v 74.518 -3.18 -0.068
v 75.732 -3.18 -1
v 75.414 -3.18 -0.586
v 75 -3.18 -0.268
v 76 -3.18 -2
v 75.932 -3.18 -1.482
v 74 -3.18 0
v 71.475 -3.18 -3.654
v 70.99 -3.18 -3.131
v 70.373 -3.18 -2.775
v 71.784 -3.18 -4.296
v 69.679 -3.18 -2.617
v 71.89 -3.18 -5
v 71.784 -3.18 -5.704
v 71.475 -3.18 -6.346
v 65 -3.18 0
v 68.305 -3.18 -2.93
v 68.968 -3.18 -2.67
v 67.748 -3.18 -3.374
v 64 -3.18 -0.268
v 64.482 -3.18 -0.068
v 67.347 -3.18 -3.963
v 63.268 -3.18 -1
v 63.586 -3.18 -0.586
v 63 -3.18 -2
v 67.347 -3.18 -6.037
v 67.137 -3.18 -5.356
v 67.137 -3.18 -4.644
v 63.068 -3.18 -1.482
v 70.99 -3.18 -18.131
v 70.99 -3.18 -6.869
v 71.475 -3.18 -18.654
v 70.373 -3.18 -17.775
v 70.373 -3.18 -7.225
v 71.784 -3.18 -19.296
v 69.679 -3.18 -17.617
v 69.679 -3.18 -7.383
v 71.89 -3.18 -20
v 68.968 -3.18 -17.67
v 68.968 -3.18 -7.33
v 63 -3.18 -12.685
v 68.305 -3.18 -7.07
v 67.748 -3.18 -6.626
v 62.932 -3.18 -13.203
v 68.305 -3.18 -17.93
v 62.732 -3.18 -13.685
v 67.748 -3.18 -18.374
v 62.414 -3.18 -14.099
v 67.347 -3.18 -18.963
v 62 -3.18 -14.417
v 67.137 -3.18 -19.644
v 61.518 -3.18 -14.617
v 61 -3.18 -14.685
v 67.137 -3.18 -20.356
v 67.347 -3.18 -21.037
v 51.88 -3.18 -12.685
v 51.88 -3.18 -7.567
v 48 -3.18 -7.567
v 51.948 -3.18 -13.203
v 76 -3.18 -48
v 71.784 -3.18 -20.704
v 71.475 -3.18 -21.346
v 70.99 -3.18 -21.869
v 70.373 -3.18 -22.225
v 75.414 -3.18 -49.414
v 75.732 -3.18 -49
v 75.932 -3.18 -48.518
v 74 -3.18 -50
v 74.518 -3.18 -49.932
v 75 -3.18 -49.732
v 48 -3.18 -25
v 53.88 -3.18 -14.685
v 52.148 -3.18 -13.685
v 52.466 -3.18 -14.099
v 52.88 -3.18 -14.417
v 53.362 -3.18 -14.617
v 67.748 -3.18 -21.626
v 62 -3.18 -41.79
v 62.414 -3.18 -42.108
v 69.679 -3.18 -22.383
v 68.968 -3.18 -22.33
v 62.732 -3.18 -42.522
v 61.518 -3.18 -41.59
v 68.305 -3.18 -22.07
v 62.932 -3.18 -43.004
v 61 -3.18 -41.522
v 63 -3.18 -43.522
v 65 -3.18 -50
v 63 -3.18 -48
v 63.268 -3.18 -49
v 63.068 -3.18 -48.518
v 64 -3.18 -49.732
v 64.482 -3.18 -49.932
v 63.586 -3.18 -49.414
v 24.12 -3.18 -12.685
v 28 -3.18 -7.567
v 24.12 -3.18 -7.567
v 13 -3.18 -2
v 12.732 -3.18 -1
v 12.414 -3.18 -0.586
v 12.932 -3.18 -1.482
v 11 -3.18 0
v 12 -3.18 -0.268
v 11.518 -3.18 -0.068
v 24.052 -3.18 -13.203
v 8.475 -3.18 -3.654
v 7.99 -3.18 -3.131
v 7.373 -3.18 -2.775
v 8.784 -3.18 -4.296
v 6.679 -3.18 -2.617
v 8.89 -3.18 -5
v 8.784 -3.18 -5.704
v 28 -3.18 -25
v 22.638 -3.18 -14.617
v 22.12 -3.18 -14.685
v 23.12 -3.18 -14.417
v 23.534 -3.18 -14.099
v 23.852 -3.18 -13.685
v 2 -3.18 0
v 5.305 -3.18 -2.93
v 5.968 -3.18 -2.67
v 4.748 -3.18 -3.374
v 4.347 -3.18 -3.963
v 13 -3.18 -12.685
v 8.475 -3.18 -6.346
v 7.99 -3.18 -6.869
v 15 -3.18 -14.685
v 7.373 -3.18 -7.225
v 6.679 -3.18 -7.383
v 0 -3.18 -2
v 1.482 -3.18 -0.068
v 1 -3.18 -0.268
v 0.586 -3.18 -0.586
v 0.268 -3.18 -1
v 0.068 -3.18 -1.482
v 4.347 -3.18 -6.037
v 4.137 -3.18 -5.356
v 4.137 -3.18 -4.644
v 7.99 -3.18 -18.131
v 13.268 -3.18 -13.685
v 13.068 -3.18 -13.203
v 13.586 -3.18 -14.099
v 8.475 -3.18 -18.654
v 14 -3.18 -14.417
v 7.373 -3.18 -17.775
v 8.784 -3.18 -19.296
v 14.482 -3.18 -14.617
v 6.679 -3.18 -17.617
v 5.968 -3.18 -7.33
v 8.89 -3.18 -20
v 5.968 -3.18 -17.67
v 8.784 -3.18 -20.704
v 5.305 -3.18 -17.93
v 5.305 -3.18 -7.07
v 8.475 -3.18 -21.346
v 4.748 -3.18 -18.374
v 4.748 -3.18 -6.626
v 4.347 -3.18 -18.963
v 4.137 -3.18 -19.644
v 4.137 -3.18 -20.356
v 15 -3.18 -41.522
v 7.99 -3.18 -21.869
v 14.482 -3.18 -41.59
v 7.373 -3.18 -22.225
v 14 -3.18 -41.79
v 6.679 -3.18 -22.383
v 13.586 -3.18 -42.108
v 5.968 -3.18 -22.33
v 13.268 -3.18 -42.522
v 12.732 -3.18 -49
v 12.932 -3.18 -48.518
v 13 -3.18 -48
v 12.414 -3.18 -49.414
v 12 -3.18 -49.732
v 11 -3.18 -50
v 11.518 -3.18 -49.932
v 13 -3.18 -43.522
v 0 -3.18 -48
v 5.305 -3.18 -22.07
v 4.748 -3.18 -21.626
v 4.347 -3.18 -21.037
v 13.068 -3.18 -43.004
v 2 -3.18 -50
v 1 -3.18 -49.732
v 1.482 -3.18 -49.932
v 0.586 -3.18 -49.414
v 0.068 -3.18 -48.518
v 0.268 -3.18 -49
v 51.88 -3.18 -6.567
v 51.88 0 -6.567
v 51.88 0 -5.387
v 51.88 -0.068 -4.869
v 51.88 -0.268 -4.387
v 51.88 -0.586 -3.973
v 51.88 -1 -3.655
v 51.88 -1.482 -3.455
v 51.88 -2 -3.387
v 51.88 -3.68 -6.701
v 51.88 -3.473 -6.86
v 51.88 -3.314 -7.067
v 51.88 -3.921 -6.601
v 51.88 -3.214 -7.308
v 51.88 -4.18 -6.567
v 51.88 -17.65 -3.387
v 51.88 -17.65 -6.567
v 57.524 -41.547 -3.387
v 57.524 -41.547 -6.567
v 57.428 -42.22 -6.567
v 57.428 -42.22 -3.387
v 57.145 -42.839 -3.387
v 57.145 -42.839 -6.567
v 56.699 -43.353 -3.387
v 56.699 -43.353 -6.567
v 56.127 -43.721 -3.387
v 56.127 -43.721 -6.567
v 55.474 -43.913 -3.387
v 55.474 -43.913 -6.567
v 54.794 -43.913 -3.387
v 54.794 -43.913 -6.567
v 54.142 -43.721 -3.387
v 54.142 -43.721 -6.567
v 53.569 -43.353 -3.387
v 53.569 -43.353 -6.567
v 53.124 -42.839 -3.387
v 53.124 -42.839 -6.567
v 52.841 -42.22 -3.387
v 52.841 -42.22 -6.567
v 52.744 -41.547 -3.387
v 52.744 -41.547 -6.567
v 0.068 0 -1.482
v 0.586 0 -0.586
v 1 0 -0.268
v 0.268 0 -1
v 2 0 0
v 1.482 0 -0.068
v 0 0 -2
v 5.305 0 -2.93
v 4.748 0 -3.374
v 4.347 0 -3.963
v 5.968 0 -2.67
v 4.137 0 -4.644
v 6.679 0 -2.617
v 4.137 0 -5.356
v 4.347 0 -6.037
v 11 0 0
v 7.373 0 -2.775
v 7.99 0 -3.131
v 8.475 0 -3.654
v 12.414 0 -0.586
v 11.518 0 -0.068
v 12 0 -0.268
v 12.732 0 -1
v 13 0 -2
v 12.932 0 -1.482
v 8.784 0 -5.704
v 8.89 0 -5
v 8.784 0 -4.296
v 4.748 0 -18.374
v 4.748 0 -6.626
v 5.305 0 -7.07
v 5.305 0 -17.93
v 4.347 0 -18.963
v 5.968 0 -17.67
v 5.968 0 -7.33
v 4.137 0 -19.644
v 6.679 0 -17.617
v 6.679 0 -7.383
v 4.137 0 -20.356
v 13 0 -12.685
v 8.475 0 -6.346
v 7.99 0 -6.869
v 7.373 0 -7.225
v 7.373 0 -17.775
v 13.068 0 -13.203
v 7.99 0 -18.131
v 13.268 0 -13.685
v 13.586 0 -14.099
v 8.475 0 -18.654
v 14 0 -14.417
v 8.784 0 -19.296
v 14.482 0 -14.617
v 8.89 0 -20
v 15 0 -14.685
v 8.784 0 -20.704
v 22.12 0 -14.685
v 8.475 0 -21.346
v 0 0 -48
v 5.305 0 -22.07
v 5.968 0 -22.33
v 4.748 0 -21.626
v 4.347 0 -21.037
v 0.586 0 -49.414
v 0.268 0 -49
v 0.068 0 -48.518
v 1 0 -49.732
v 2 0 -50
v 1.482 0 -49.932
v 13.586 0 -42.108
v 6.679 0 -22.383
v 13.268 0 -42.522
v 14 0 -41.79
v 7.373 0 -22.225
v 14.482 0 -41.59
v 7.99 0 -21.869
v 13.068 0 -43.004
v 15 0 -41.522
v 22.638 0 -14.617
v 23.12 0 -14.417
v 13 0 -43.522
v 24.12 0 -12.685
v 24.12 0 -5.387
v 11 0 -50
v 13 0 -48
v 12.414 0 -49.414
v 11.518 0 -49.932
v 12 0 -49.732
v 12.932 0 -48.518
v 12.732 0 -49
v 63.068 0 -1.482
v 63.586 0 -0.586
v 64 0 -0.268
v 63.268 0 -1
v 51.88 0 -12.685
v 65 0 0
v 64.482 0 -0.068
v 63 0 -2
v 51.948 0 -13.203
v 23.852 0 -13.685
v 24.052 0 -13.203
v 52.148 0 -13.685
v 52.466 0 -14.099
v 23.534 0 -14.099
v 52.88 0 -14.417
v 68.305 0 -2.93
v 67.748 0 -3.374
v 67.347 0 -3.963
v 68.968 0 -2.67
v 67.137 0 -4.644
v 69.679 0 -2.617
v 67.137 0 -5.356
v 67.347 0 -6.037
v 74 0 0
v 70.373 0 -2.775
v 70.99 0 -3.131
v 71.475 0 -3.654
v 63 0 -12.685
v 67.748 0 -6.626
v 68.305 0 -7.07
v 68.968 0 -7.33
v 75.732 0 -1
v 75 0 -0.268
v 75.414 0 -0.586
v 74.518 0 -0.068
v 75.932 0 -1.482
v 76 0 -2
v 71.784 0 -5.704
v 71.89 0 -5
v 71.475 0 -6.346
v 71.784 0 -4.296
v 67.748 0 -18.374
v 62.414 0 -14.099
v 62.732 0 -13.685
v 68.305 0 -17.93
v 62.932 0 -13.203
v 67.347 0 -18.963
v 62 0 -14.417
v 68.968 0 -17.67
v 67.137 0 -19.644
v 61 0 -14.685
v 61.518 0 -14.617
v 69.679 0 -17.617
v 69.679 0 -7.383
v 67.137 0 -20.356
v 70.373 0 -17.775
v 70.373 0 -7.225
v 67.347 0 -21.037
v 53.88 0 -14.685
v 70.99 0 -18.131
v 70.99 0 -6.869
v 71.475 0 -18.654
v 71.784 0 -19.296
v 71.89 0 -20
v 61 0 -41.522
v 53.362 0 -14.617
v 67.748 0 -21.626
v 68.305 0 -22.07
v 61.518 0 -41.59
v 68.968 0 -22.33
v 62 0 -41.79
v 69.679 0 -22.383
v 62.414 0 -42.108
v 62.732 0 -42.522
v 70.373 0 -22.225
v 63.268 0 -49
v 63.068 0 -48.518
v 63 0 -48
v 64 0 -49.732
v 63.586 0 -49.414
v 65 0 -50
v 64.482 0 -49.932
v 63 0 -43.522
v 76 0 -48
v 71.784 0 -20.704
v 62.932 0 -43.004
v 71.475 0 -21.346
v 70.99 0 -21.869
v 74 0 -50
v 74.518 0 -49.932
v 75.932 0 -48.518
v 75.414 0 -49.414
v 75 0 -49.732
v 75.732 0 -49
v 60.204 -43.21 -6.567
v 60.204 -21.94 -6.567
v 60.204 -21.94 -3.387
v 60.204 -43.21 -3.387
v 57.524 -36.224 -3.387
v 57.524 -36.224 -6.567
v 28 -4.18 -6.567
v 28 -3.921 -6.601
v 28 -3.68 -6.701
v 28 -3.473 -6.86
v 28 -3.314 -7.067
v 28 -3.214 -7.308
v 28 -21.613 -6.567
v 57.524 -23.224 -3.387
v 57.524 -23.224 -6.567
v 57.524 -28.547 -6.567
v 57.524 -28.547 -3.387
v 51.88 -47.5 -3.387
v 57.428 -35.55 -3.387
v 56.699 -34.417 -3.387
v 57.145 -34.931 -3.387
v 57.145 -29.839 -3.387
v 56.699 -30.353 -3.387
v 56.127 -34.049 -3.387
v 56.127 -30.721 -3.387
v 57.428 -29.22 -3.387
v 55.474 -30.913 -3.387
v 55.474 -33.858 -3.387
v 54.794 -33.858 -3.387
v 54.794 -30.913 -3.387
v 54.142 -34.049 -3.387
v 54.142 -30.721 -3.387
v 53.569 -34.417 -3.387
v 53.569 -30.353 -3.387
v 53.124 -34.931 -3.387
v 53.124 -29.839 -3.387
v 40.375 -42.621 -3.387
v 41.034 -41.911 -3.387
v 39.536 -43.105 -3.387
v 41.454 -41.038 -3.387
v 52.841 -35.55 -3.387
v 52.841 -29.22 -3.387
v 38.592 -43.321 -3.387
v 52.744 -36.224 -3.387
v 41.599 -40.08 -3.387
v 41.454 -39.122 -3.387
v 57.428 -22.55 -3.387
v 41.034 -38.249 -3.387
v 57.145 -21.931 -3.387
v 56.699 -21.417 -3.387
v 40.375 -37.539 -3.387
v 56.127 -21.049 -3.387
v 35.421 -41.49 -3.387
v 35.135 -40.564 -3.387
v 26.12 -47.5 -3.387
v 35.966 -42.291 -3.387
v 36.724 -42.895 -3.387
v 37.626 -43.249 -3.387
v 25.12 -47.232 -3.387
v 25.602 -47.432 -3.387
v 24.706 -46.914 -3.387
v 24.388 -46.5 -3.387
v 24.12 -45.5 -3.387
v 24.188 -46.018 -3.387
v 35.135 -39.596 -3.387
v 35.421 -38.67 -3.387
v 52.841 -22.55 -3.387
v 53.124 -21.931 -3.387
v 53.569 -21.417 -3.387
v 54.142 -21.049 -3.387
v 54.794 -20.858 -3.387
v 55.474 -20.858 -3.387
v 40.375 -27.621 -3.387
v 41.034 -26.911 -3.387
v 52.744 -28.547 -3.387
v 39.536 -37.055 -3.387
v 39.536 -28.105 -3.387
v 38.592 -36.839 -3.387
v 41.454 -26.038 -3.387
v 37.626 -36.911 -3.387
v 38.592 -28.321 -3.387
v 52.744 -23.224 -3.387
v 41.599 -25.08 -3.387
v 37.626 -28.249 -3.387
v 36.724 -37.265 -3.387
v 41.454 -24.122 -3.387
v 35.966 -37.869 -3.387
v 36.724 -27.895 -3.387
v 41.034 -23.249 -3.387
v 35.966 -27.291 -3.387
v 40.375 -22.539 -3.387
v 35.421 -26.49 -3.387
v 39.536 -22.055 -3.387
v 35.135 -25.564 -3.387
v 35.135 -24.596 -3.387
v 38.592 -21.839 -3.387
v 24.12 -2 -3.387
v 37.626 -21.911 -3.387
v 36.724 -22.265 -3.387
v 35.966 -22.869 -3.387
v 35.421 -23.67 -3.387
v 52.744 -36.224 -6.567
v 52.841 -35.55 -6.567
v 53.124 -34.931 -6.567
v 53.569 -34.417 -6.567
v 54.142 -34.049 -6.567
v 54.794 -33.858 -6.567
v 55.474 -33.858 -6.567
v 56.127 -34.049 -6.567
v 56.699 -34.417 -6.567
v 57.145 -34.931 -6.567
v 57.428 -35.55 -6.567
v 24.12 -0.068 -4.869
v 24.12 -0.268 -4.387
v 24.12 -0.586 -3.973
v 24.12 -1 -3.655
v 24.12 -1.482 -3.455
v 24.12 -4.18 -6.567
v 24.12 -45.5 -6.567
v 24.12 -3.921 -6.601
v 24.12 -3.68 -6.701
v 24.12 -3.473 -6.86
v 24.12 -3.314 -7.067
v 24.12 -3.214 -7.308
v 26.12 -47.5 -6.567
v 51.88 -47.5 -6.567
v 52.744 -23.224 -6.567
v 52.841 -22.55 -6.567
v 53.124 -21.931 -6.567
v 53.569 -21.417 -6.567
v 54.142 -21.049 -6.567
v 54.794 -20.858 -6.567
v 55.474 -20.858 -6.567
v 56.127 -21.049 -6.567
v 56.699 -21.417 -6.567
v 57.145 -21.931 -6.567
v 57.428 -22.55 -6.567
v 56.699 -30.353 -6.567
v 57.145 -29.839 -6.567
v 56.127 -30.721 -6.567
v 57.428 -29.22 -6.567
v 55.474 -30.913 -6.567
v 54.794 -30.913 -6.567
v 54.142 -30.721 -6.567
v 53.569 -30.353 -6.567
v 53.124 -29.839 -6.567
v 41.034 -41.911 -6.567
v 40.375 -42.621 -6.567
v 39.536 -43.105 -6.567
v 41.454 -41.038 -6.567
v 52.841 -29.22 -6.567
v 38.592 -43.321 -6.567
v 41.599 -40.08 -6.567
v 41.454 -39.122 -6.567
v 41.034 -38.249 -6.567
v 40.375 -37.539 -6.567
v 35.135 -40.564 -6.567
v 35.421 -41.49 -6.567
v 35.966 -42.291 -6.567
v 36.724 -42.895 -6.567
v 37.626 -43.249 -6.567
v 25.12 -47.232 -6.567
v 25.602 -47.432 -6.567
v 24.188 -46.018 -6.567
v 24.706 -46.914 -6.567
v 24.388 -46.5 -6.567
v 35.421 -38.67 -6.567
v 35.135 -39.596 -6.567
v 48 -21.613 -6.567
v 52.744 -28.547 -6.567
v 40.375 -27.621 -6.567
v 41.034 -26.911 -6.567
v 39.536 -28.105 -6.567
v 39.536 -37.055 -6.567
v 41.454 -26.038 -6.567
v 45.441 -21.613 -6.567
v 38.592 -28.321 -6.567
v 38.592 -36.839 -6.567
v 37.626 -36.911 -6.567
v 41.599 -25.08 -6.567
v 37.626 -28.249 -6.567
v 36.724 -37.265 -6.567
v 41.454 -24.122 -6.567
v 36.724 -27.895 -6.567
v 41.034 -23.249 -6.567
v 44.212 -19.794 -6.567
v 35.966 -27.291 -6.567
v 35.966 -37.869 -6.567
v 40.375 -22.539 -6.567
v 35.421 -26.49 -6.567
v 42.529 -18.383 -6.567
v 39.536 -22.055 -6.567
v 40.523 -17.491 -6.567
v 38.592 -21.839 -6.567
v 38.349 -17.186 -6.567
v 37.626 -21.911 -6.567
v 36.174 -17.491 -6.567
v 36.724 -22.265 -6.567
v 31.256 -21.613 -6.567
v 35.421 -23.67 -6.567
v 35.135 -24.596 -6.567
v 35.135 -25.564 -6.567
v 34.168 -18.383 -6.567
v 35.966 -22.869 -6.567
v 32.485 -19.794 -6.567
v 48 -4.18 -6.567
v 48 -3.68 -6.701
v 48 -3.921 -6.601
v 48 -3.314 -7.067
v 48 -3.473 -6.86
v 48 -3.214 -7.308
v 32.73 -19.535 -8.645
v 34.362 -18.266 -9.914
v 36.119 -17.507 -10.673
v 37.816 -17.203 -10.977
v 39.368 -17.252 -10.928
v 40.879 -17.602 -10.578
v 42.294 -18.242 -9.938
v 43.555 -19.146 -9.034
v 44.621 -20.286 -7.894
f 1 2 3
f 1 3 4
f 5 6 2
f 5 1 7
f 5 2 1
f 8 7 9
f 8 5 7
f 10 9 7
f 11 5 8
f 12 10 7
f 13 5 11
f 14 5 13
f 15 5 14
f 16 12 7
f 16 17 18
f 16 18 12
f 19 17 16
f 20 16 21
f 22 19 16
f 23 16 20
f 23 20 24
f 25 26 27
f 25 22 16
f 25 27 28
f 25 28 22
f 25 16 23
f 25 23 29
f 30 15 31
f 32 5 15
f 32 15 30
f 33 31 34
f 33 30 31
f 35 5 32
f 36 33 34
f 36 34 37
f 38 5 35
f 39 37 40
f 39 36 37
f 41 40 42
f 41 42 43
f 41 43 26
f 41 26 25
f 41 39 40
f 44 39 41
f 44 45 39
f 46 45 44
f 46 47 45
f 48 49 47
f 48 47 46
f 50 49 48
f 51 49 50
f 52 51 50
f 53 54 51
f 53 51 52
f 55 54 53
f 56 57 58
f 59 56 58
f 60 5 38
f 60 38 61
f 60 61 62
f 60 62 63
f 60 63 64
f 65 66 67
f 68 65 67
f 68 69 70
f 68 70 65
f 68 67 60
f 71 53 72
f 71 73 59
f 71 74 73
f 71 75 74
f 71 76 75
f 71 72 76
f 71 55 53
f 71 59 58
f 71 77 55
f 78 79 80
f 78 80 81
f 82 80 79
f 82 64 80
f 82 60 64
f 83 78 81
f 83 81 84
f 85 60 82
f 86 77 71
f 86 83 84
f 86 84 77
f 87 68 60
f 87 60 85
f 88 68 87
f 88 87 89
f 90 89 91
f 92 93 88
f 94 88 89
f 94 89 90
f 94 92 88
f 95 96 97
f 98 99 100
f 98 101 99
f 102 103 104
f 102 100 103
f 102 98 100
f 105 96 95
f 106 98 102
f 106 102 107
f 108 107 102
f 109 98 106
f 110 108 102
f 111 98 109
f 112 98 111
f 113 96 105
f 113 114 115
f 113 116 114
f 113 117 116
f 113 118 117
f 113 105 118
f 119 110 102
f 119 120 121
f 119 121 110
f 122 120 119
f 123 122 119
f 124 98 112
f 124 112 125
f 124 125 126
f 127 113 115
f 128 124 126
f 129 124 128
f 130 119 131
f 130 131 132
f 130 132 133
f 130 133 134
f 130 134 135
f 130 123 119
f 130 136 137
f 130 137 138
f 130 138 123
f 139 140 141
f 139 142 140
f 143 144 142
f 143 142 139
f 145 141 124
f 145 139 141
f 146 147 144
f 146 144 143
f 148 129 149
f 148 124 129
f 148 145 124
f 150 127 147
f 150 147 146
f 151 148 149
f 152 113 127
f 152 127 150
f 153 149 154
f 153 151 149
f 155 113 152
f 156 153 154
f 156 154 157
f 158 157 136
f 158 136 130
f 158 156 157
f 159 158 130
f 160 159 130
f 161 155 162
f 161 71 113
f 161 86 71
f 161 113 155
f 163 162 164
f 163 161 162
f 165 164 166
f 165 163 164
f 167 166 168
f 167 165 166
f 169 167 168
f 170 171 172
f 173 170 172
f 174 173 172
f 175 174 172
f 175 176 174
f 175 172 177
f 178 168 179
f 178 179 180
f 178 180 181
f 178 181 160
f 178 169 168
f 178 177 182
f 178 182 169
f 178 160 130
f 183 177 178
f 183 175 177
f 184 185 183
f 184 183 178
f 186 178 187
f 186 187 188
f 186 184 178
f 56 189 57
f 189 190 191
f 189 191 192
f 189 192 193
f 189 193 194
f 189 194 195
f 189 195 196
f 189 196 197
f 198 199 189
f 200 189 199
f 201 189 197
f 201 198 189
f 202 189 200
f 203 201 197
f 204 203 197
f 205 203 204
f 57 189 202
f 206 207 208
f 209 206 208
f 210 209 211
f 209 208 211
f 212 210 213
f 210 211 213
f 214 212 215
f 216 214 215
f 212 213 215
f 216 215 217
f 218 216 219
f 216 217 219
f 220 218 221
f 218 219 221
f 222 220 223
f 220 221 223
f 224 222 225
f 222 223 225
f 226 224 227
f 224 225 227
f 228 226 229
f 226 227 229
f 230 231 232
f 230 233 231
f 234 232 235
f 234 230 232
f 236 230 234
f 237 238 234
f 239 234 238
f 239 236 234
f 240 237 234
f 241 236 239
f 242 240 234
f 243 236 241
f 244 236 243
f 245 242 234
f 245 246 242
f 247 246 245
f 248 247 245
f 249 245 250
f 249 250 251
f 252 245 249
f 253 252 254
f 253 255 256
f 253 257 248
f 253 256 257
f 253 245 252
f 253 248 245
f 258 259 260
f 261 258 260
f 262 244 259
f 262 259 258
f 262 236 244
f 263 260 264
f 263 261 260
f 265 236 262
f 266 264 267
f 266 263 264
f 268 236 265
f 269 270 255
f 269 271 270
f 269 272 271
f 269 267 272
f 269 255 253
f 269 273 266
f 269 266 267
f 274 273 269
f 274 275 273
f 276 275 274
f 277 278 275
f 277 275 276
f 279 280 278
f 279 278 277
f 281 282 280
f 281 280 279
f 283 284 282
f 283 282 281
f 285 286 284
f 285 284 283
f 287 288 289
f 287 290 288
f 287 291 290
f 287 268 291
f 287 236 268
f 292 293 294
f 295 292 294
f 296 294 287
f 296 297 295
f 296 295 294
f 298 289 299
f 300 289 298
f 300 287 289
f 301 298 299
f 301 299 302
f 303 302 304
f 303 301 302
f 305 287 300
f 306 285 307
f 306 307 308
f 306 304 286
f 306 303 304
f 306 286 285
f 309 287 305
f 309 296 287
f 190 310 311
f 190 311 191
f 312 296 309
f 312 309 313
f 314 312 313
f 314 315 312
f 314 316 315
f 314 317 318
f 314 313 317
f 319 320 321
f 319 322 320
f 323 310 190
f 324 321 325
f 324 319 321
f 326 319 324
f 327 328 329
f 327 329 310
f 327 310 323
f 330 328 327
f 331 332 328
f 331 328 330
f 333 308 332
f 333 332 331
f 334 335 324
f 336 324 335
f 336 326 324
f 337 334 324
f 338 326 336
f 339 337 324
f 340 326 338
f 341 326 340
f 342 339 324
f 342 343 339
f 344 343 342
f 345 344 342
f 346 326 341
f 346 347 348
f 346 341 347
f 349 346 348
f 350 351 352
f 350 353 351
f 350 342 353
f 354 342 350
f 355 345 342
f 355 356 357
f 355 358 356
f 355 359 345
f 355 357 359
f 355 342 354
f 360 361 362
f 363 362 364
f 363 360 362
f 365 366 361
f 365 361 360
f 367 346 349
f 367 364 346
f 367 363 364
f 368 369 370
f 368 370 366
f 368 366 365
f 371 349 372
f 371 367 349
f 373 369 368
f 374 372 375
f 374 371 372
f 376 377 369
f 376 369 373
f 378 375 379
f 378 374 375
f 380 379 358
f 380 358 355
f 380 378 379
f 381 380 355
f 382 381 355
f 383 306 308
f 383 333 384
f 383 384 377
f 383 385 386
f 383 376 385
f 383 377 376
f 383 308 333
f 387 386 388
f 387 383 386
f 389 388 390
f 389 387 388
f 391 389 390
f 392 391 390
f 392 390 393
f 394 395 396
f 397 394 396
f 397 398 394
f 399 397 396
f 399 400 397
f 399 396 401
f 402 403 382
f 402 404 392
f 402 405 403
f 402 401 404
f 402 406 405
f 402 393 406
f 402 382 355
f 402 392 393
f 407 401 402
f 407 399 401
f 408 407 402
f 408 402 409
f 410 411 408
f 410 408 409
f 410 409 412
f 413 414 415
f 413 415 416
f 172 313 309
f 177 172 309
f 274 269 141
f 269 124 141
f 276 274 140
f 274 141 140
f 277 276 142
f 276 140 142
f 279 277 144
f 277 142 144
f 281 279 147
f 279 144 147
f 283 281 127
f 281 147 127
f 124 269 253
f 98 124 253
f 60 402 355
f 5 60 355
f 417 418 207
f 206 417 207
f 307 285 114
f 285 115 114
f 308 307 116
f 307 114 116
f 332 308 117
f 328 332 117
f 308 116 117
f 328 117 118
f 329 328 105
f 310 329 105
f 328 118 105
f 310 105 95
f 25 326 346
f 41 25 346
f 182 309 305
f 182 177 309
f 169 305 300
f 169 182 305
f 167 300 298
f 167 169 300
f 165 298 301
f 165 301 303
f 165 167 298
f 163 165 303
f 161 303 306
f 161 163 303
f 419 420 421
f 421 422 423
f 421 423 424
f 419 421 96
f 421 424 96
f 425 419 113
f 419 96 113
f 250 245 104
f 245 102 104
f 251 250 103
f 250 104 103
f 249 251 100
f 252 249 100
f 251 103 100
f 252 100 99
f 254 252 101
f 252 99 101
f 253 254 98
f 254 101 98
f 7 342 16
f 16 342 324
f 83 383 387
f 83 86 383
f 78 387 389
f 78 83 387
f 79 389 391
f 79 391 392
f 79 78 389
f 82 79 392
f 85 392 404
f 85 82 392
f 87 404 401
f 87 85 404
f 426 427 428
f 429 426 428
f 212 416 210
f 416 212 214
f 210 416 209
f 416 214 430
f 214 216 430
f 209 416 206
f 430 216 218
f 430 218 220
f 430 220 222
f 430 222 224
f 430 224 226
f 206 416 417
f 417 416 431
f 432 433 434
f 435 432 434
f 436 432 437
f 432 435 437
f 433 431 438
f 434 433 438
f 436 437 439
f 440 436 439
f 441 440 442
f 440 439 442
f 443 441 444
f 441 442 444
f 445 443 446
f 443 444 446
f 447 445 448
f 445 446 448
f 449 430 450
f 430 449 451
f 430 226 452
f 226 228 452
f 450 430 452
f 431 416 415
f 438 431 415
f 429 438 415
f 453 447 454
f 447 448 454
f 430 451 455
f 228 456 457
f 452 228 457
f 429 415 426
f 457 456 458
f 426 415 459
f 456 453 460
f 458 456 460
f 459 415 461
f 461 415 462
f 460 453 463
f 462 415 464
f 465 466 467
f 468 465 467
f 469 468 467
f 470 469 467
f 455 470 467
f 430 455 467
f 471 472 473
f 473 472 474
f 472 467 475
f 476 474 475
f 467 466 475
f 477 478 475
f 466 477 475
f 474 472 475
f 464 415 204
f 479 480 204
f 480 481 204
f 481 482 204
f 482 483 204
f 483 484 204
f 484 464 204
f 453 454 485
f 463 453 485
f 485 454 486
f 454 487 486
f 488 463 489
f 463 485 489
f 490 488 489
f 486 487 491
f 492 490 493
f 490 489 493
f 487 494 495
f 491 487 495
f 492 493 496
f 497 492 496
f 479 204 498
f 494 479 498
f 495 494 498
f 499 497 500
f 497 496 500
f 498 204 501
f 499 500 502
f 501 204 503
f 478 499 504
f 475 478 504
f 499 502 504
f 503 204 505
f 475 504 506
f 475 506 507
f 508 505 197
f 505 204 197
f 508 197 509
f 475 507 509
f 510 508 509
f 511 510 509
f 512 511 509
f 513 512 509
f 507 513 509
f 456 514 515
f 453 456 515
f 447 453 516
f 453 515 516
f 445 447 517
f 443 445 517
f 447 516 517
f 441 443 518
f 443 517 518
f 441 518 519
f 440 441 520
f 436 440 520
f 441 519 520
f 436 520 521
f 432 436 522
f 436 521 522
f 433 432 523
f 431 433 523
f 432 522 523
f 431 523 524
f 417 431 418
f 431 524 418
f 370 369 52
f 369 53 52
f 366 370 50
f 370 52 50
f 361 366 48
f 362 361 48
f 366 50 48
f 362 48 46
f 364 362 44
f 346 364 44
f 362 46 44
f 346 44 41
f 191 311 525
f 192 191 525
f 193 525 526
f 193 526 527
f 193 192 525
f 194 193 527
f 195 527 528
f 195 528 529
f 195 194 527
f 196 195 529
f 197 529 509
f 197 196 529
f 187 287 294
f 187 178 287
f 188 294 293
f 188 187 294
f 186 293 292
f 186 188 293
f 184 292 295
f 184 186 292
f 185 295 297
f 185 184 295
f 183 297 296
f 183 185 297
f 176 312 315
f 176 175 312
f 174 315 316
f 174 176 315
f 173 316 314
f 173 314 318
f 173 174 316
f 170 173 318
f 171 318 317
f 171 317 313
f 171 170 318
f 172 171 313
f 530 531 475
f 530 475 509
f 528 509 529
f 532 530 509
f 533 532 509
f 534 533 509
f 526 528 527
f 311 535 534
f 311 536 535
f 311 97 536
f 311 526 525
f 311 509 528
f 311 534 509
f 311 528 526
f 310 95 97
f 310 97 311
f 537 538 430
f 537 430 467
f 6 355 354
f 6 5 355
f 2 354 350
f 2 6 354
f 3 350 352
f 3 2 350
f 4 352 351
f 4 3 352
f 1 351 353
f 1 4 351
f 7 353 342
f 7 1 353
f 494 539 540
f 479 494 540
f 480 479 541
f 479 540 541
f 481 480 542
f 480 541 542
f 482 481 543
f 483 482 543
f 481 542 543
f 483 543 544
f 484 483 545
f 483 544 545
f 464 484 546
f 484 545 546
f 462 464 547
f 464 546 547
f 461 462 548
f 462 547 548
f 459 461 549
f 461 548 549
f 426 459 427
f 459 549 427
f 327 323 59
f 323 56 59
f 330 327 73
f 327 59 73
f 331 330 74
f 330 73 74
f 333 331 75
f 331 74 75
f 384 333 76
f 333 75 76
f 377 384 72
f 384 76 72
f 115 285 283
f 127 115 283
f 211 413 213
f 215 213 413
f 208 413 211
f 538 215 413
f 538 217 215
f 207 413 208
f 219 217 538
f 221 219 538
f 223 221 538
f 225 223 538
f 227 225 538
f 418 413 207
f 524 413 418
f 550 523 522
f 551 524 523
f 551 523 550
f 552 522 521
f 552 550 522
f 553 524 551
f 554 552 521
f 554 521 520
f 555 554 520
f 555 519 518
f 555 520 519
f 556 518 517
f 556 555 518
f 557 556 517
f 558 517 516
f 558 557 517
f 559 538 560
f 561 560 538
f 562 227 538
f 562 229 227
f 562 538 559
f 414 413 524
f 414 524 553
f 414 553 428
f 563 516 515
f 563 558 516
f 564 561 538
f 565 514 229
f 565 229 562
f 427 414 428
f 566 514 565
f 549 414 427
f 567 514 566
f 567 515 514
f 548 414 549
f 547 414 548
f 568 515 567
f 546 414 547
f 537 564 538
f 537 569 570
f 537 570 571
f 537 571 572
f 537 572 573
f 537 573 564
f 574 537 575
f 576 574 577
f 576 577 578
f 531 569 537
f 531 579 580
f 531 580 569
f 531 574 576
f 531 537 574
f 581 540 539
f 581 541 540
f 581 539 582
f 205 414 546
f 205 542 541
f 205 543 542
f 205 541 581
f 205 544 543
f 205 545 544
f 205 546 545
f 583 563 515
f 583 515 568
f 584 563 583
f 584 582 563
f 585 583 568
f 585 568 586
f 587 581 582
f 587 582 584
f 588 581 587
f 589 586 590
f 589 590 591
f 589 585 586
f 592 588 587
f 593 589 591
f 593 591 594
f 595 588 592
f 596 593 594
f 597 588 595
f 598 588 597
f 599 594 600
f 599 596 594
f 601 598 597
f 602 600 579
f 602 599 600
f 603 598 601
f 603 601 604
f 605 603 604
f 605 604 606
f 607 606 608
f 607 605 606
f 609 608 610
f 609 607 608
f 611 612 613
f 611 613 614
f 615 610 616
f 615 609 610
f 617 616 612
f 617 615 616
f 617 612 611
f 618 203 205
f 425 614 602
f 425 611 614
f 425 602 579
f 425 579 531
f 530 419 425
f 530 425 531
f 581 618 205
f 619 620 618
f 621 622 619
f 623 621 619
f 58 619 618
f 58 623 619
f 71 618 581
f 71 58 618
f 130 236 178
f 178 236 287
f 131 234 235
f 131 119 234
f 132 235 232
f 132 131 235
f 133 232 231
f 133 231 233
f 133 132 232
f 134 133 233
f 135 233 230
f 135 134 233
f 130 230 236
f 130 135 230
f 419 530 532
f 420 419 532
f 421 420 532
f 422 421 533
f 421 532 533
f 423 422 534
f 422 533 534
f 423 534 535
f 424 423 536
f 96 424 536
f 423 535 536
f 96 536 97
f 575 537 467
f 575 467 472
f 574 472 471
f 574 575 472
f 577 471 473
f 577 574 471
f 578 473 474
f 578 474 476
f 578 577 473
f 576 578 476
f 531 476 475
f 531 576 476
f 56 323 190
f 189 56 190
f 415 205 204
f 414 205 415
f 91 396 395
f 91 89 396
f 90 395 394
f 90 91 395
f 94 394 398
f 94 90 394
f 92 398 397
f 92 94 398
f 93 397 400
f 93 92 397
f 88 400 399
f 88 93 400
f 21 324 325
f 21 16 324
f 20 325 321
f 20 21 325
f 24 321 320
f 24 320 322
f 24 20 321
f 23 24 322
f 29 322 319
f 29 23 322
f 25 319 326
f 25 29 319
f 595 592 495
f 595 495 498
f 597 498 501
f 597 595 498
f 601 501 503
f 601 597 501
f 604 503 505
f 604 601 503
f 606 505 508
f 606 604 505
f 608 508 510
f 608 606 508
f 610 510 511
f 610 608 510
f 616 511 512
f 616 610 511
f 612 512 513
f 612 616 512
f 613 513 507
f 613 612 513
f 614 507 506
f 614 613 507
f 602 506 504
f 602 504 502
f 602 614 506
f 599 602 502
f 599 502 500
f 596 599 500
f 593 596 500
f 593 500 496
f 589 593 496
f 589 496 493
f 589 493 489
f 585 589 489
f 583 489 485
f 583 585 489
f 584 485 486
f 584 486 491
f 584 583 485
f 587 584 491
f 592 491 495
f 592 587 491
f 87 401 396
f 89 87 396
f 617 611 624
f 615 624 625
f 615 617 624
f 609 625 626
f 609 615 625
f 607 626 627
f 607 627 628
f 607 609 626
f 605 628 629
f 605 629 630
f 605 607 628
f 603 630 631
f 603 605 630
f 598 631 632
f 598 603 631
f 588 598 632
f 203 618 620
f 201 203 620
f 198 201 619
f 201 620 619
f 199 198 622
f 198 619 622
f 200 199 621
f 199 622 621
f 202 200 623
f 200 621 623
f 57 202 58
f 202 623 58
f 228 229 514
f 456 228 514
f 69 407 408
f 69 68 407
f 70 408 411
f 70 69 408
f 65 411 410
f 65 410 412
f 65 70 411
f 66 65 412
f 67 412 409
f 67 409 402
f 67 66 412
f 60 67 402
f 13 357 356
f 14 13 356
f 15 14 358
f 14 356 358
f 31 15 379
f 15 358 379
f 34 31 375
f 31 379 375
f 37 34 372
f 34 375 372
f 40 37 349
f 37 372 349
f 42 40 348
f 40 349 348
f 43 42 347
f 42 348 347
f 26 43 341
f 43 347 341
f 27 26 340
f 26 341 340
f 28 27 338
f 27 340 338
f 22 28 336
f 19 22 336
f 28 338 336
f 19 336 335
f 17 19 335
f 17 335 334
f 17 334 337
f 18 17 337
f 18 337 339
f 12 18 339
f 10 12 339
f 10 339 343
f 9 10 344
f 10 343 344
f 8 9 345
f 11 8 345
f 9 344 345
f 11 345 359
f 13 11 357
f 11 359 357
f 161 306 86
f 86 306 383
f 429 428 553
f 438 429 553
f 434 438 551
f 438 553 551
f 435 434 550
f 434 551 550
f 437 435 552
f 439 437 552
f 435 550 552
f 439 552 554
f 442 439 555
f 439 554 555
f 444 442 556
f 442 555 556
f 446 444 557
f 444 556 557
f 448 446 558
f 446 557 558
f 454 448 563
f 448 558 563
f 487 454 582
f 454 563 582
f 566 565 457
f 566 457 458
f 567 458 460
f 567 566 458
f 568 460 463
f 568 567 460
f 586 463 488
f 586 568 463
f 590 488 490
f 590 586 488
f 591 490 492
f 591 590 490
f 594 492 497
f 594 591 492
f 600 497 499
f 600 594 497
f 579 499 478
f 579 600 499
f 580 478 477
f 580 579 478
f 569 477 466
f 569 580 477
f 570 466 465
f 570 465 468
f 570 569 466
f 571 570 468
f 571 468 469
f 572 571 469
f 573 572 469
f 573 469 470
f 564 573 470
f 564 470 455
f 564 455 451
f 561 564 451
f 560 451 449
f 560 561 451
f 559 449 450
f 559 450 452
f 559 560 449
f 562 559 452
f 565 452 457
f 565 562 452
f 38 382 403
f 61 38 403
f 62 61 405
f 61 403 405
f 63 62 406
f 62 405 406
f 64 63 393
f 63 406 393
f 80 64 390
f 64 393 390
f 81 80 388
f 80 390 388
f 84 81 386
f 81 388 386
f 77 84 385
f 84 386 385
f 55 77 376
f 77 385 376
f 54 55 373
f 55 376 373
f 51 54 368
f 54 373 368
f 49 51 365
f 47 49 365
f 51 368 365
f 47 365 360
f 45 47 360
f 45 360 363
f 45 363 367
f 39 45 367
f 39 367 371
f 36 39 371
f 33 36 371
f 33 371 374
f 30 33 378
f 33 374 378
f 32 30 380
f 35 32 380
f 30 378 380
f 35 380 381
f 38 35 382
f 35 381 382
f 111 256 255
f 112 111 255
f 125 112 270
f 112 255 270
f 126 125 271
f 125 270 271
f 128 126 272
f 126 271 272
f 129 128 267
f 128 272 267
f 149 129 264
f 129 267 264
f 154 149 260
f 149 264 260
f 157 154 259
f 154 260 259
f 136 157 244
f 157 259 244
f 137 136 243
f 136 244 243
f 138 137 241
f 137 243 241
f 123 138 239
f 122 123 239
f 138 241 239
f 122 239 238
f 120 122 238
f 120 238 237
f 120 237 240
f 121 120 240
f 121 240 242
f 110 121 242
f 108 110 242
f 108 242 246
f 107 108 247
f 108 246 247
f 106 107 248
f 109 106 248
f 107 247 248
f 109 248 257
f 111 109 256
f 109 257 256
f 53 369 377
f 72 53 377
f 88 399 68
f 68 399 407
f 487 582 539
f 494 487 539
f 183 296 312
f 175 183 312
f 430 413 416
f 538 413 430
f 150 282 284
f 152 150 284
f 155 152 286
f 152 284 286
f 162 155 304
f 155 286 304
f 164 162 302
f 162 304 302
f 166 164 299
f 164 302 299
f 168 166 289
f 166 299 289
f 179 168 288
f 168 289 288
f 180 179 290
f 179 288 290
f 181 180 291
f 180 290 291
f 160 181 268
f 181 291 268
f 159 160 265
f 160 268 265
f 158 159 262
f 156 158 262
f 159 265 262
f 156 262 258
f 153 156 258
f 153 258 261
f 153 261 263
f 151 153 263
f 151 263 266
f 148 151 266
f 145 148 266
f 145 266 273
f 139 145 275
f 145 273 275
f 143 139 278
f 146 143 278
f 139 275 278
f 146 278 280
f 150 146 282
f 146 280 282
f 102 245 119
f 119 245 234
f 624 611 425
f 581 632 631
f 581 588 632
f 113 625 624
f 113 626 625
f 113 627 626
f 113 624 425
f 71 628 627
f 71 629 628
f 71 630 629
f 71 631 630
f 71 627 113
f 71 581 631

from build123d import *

# Parameters (mm, degrees)
BOSS_EXTRUDE2_DEPTH = 3.18
SKETCH8_R           = 3.25
BOSS_EXTRUDE3_DEPTH = 3.18
FILLET4_R           = 2
FILLET5_R           = 1
SKETCH9_R           = 2.39
CUT_EXTRUDE1_DEPTH  = 3.18
FILLET6_R           = 2
FILLET7_R           = 2
FILLET8_R           = 2
BOSS_EXTRUDE6_DEPTH = 10
SKETCH12_R          = 7.894491475
CUT_EXTRUDE2_DEPTH  = 20


with BuildPart() as part:
    # Sketch1 → Boss-Extrude2 (new body)
    with BuildSketch(Plane(origin=(0, 0, 0), x_dir=(1, 0, 0), z_dir=(0, 1, 0))):
        Polygon((0, 0), (0, 50), (13, 50), (13, 41.521912351), (63, 41.521912351), (63, 50), (76, 50), (76, 0), (63, 0), (63, 14.685258964), (51.88, 14.685258964), (51.88, 6.566903426), (24.12, 6.566903426), (24.12, 14.685258964), (13, 14.685258964), (13, 0), align=None)
    extrude(amount=-BOSS_EXTRUDE2_DEPTH)

    # Sketch8 → Boss-Extrude3 (add)
    with BuildSketch(Plane.XY.offset(-6.566903426)):
        with BuildLine():
            Line((24.12, -45.5), (24.12, -20.153398116))
            Line((24.12, -20.153398116), (24.12, 0))
            Line((24.12, 0), (51.879574545, 0))
            Line((51.879574545, 0), (51.879574545, -17.65))
            Line((51.879574545, -17.65), (60.204359999, -21.94))
            Line((60.204359999, -21.94), (60.204359999, -43.21))
            Line((60.204359999, -43.21), (51.879574545, -47.5))
            Line((51.879574545, -47.5), (26.12, -47.5))
            ThreePointArc((26.12, -47.5), (24.705786438, -46.914213562), (24.12, -45.5))
        make_face()
        with Locations((38.348750497, -25.08)):
            Circle(SKETCH8_R, mode=Mode.SUBTRACT)
        with Locations((38.348750497, -40.08)):
            Circle(SKETCH8_R, mode=Mode.SUBTRACT)
        with BuildLine():
            Line((57.524359999, -23.223501404), (57.524359999, -28.546918648))
            ThreePointArc((57.524359999, -28.546918648), (55.134359999, -30.936918648), (52.744359999, -28.546918648))
            Line((52.744359999, -28.546918648), (52.744359999, -23.223501404))
            ThreePointArc((52.744359999, -23.223501404), (55.134359999, -20.833501404), (57.524359999, -23.223501404))
        make_face(mode=Mode.SUBTRACT)
        with BuildLine():
            Line((57.524359999, -36.223501404), (57.524359999, -41.546918648))
            ThreePointArc((57.524359999, -41.546918648), (55.134359999, -43.936918648), (52.744359999, -41.546918648))
            Line((52.744359999, -41.546918648), (52.744359999, -36.223501404))
            ThreePointArc((52.744359999, -36.223501404), (55.134359999, -33.833501404), (57.524359999, -36.223501404))
        make_face(mode=Mode.SUBTRACT)
    extrude(amount=BOSS_EXTRUDE3_DEPTH)

    # Fillet4
    fillet4_edges = [part.edges().sort_by_distance(p)[0] for p in [
        (37.999787272, 0, -3.386903426),
    ]]
    fillet(fillet4_edges, radius=FILLET4_R)

    # Fillet5
    fillet5_edges = [part.edges().sort_by_distance(p)[0] for p in [
        (37.999787272, -3.18, -6.566903426),
    ]]
    fillet(fillet5_edges, radius=FILLET5_R)

    # Sketch9 → Cut-Extrude1 (cut)
    with BuildSketch(Plane(origin=(0, 0, 0), x_dir=(1, 0, 0), z_dir=(0, 1, 0))):
        with Locations((6.5, 5)):
            Circle(SKETCH9_R)
        with Locations((6.5, 20)):
            Circle(SKETCH9_R)
        with Locations((69.5, 20)):
            Circle(SKETCH9_R)
        with Locations((69.5, 5)):
            Circle(SKETCH9_R)
    extrude(amount=-CUT_EXTRUDE1_DEPTH, mode=Mode.SUBTRACT)

    # Fillet6
    fillet6_edges = [part.edges().sort_by_distance(p)[0] for p in [
        (0, -1.59, 0),
    ]]
    fillet(fillet6_edges, radius=FILLET6_R)

    # Fillet7
    fillet7_edges = [part.edges().sort_by_distance(p)[0] for p in [
        (13, -1.59, 0),
    ]]
    fillet(fillet7_edges, radius=FILLET7_R)

    # Fillet8
    fillet8_edges = [part.edges().sort_by_distance(p)[0] for p in [
        (0, -1.59, -50),
        (13, -1.59, -50),
        (13, -1.59, -41.521912351),
        (63, -1.59, -41.521912351),
        (63, -1.59, -50),
        (76, -1.59, -50),
        (76, -1.59, 0),
        (63, -1.59, 0),
        (63, -1.59, -14.685258964),
        (51.88, -1.59, -14.685258964),
        (24.12, -1.59, -14.685258964),
        (13, -1.59, -14.685258964),
    ]]
    fillet(fillet8_edges, radius=FILLET8_R)

    # Sketch11 → Boss-Extrude6 (add, symmetric)
    with BuildSketch(Plane(origin=(38, 0, 0), x_dir=(0, 0, -1), z_dir=(1, 0, 0))):
        Polygon((25, -3.18), (6.54535076, -3.18), (6.54535076, -21.63464924), align=None)
    extrude(amount=BOSS_EXTRUDE6_DEPTH, both=True)

    # Sketch12 → Cut-Extrude2 (cut)
    with BuildSketch(Plane(origin=(0, 0, -6.566903426), x_dir=(-1, 0, 0), z_dir=(0, 0, -1))):
        with Locations((-38.348750497, -25.08)):
            Circle(SKETCH12_R)
    extrude(amount=CUT_EXTRUDE2_DEPTH, mode=Mode.SUBTRACT)


solid = part.part
